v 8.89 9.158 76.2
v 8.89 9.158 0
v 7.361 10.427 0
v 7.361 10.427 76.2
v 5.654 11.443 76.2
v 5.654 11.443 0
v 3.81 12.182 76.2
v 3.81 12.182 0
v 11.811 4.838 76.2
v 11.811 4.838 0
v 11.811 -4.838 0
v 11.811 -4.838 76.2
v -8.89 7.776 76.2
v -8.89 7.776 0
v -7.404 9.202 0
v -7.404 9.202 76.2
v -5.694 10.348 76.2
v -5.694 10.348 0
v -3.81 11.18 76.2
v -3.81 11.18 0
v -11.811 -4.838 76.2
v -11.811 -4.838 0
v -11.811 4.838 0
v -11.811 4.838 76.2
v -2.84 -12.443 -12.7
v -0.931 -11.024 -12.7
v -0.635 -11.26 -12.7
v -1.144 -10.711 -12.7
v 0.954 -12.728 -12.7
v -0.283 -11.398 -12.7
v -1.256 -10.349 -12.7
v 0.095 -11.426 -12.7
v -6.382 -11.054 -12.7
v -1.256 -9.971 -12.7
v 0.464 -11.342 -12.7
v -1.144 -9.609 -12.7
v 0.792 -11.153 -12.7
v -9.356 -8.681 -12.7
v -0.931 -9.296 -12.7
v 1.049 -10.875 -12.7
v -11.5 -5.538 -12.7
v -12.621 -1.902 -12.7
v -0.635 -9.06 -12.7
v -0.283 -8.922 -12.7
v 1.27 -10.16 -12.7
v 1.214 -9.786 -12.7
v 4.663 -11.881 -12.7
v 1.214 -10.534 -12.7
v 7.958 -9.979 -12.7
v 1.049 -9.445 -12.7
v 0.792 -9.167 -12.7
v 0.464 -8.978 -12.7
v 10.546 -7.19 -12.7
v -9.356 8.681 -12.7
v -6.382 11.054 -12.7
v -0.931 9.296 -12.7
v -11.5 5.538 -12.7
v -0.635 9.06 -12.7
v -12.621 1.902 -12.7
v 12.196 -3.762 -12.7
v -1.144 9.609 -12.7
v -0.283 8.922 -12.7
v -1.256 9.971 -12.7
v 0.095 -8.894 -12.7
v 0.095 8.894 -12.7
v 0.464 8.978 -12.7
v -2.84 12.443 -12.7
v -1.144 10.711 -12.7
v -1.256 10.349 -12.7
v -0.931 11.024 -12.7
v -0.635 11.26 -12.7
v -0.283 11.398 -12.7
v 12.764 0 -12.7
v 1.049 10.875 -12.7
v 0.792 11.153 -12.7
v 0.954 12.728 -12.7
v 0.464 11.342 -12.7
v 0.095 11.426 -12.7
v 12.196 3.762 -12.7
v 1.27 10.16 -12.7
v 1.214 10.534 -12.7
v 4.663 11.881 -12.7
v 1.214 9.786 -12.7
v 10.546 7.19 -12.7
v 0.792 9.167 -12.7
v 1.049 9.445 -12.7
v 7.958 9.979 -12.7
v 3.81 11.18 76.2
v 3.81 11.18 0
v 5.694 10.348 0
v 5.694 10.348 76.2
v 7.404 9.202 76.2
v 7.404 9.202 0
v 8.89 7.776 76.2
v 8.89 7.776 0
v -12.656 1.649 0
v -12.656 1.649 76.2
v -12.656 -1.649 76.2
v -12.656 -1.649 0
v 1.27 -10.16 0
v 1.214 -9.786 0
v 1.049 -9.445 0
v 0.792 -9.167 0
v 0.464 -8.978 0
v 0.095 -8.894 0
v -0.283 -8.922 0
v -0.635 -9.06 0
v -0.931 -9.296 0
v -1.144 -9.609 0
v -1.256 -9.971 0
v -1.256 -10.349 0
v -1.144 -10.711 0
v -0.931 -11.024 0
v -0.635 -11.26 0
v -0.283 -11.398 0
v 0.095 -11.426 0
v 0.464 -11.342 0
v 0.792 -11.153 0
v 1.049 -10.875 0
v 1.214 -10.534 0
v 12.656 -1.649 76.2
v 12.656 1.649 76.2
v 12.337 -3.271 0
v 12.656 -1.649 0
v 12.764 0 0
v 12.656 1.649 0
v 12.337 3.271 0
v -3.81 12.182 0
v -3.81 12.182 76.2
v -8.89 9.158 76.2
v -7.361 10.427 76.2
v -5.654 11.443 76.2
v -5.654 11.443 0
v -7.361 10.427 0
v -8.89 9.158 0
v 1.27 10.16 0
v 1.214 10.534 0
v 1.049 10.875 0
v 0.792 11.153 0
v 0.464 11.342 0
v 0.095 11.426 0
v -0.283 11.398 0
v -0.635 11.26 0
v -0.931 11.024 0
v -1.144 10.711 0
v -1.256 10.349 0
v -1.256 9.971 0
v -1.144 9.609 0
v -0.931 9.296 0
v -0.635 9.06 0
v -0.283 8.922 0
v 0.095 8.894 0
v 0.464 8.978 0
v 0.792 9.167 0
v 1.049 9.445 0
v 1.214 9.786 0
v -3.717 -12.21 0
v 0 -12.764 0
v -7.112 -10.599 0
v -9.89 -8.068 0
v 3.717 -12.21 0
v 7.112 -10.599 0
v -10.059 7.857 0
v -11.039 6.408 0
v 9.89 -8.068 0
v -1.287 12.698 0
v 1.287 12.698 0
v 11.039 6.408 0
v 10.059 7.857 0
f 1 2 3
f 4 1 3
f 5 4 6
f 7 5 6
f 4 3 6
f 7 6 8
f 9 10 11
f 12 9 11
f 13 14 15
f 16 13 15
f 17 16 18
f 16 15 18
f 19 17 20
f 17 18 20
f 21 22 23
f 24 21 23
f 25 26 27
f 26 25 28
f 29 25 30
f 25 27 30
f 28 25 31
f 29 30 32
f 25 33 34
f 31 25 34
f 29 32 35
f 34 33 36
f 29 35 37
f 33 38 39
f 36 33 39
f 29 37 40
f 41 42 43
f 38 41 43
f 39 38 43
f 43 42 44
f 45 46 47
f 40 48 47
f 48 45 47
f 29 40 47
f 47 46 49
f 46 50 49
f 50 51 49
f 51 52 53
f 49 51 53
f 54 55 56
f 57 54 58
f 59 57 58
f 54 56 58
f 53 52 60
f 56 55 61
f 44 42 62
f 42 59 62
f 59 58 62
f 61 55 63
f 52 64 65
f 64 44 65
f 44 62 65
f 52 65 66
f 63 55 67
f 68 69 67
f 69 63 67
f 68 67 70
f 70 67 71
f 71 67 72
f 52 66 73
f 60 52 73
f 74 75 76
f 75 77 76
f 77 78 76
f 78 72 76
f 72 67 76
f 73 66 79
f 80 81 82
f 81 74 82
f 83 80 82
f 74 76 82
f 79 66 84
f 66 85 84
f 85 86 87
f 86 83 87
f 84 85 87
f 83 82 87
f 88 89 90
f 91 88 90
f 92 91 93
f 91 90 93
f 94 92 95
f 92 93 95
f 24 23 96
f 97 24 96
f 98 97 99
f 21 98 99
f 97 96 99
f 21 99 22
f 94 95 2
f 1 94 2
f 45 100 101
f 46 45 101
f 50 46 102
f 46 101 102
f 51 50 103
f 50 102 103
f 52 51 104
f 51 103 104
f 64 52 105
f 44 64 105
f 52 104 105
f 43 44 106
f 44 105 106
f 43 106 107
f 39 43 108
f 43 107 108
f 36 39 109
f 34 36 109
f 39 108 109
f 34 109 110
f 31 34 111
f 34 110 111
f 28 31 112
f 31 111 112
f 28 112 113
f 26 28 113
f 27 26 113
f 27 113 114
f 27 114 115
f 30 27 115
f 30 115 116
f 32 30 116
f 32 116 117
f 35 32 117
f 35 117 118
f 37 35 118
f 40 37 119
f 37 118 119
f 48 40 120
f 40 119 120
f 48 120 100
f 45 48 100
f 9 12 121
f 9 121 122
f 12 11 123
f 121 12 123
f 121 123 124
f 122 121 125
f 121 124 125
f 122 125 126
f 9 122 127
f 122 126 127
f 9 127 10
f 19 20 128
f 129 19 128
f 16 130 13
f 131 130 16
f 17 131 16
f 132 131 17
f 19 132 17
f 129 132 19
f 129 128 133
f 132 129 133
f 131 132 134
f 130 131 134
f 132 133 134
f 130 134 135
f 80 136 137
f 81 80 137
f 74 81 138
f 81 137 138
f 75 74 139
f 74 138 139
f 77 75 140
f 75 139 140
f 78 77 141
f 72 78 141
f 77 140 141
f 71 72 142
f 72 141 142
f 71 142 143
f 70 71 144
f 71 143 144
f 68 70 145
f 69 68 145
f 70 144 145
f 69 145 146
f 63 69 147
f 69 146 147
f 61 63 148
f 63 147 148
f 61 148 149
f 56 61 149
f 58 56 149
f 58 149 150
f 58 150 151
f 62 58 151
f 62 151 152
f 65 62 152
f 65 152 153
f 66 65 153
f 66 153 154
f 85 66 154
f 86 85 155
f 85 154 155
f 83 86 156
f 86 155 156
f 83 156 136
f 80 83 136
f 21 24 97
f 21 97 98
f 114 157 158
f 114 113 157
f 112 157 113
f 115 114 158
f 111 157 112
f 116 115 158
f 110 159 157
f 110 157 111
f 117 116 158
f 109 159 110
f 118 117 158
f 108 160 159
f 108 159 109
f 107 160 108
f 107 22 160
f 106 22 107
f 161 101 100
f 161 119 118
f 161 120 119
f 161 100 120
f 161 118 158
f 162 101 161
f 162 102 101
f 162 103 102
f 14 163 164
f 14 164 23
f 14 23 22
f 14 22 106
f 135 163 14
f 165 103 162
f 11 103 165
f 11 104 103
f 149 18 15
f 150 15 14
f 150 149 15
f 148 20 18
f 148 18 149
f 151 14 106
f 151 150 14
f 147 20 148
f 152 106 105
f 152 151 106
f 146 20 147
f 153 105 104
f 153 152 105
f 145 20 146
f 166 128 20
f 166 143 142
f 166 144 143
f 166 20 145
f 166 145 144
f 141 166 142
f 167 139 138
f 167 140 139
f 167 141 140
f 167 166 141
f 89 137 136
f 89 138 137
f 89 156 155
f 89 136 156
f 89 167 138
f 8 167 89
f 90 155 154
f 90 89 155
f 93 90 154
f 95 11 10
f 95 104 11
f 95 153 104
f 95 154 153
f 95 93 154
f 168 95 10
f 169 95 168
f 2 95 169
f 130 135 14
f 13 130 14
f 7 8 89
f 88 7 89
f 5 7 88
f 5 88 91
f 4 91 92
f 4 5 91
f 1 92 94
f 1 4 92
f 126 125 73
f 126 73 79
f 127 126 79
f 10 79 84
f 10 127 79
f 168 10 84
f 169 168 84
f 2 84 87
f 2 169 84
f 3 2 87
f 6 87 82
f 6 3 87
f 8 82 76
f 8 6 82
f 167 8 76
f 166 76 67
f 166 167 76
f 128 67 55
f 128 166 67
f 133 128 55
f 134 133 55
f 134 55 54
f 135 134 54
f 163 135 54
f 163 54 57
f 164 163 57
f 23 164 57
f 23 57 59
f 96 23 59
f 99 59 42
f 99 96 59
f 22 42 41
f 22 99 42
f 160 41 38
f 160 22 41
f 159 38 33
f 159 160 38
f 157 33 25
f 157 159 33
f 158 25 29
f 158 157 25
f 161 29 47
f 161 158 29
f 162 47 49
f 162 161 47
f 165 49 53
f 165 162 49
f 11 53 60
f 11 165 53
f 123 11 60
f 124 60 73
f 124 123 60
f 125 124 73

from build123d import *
from build123d import SkipClean  # not in build123d's __all__

# Parameters (mm, degrees)
F1_R     = 12.7635
F1_R_2   = 1.27
F2_DEPTH = 12.7
F3_DEPTH = 76.2


with BuildPart() as f2:
    # F1 (on Top) → F2 (new body)
    with BuildSketch(Plane.XY):
        Circle(F1_R)
        with Locations((0, -10.16)):
            Circle(F1_R_2, mode=Mode.SUBTRACT)
        with Locations((0, 10.16)):
            Circle(F1_R_2, mode=Mode.SUBTRACT)
    extrude(amount=-F2_DEPTH)

    # F0 (on Top) → F3 (join)
    with BuildSketch(Plane.XY):
        with BuildLine():
            Line((-3.81, 11.1796073724), (-3.81, 12.1815775764))
            ThreePointArc((-3.81, 12.1815775764), (-6.5274436814, 10.9681088268), (-8.89, 9.1583203837))
            Line((-8.89, 9.1583203837), (-8.89, 7.7760929135))
            ThreePointArc((-8.89, 7.7760929135), (-6.5740761836, 9.8123006136), (-3.81, 11.1796073724))
        make_face()
        with BuildLine():
            Line((-11.811, -4.8380999628), (-11.811, 4.8380999628))
            ThreePointArc((-11.811, 4.8380999628), (-12.7635, 0), (-11.811, -4.8380999628))
        make_face()
        with BuildLine():
            ThreePointArc((11.811, -4.8380999628), (12.7635, 0), (11.811, 4.8380999628))
            Line((11.811, 4.8380999628), (11.811, -4.8380999628))
        make_face()
        with BuildLine():
            ThreePointArc((8.89, 9.1583203837), (6.5274436814, 10.9681088268), (3.81, 12.1815775764))
            Line((3.81, 12.1815775764), (3.81, 11.1796073724))
            ThreePointArc((3.81, 11.1796073724), (6.5740761836, 9.8123006136), (8.89, 7.7760929135))
            Line((8.89, 7.7760929135), (8.89, 9.1583203837))
        make_face()
    with SkipClean():  # cleaning this boolean's faces spoils the solid; the shape is the same uncleaned
        extrude(amount=F3_DEPTH)


solid = f2.part
